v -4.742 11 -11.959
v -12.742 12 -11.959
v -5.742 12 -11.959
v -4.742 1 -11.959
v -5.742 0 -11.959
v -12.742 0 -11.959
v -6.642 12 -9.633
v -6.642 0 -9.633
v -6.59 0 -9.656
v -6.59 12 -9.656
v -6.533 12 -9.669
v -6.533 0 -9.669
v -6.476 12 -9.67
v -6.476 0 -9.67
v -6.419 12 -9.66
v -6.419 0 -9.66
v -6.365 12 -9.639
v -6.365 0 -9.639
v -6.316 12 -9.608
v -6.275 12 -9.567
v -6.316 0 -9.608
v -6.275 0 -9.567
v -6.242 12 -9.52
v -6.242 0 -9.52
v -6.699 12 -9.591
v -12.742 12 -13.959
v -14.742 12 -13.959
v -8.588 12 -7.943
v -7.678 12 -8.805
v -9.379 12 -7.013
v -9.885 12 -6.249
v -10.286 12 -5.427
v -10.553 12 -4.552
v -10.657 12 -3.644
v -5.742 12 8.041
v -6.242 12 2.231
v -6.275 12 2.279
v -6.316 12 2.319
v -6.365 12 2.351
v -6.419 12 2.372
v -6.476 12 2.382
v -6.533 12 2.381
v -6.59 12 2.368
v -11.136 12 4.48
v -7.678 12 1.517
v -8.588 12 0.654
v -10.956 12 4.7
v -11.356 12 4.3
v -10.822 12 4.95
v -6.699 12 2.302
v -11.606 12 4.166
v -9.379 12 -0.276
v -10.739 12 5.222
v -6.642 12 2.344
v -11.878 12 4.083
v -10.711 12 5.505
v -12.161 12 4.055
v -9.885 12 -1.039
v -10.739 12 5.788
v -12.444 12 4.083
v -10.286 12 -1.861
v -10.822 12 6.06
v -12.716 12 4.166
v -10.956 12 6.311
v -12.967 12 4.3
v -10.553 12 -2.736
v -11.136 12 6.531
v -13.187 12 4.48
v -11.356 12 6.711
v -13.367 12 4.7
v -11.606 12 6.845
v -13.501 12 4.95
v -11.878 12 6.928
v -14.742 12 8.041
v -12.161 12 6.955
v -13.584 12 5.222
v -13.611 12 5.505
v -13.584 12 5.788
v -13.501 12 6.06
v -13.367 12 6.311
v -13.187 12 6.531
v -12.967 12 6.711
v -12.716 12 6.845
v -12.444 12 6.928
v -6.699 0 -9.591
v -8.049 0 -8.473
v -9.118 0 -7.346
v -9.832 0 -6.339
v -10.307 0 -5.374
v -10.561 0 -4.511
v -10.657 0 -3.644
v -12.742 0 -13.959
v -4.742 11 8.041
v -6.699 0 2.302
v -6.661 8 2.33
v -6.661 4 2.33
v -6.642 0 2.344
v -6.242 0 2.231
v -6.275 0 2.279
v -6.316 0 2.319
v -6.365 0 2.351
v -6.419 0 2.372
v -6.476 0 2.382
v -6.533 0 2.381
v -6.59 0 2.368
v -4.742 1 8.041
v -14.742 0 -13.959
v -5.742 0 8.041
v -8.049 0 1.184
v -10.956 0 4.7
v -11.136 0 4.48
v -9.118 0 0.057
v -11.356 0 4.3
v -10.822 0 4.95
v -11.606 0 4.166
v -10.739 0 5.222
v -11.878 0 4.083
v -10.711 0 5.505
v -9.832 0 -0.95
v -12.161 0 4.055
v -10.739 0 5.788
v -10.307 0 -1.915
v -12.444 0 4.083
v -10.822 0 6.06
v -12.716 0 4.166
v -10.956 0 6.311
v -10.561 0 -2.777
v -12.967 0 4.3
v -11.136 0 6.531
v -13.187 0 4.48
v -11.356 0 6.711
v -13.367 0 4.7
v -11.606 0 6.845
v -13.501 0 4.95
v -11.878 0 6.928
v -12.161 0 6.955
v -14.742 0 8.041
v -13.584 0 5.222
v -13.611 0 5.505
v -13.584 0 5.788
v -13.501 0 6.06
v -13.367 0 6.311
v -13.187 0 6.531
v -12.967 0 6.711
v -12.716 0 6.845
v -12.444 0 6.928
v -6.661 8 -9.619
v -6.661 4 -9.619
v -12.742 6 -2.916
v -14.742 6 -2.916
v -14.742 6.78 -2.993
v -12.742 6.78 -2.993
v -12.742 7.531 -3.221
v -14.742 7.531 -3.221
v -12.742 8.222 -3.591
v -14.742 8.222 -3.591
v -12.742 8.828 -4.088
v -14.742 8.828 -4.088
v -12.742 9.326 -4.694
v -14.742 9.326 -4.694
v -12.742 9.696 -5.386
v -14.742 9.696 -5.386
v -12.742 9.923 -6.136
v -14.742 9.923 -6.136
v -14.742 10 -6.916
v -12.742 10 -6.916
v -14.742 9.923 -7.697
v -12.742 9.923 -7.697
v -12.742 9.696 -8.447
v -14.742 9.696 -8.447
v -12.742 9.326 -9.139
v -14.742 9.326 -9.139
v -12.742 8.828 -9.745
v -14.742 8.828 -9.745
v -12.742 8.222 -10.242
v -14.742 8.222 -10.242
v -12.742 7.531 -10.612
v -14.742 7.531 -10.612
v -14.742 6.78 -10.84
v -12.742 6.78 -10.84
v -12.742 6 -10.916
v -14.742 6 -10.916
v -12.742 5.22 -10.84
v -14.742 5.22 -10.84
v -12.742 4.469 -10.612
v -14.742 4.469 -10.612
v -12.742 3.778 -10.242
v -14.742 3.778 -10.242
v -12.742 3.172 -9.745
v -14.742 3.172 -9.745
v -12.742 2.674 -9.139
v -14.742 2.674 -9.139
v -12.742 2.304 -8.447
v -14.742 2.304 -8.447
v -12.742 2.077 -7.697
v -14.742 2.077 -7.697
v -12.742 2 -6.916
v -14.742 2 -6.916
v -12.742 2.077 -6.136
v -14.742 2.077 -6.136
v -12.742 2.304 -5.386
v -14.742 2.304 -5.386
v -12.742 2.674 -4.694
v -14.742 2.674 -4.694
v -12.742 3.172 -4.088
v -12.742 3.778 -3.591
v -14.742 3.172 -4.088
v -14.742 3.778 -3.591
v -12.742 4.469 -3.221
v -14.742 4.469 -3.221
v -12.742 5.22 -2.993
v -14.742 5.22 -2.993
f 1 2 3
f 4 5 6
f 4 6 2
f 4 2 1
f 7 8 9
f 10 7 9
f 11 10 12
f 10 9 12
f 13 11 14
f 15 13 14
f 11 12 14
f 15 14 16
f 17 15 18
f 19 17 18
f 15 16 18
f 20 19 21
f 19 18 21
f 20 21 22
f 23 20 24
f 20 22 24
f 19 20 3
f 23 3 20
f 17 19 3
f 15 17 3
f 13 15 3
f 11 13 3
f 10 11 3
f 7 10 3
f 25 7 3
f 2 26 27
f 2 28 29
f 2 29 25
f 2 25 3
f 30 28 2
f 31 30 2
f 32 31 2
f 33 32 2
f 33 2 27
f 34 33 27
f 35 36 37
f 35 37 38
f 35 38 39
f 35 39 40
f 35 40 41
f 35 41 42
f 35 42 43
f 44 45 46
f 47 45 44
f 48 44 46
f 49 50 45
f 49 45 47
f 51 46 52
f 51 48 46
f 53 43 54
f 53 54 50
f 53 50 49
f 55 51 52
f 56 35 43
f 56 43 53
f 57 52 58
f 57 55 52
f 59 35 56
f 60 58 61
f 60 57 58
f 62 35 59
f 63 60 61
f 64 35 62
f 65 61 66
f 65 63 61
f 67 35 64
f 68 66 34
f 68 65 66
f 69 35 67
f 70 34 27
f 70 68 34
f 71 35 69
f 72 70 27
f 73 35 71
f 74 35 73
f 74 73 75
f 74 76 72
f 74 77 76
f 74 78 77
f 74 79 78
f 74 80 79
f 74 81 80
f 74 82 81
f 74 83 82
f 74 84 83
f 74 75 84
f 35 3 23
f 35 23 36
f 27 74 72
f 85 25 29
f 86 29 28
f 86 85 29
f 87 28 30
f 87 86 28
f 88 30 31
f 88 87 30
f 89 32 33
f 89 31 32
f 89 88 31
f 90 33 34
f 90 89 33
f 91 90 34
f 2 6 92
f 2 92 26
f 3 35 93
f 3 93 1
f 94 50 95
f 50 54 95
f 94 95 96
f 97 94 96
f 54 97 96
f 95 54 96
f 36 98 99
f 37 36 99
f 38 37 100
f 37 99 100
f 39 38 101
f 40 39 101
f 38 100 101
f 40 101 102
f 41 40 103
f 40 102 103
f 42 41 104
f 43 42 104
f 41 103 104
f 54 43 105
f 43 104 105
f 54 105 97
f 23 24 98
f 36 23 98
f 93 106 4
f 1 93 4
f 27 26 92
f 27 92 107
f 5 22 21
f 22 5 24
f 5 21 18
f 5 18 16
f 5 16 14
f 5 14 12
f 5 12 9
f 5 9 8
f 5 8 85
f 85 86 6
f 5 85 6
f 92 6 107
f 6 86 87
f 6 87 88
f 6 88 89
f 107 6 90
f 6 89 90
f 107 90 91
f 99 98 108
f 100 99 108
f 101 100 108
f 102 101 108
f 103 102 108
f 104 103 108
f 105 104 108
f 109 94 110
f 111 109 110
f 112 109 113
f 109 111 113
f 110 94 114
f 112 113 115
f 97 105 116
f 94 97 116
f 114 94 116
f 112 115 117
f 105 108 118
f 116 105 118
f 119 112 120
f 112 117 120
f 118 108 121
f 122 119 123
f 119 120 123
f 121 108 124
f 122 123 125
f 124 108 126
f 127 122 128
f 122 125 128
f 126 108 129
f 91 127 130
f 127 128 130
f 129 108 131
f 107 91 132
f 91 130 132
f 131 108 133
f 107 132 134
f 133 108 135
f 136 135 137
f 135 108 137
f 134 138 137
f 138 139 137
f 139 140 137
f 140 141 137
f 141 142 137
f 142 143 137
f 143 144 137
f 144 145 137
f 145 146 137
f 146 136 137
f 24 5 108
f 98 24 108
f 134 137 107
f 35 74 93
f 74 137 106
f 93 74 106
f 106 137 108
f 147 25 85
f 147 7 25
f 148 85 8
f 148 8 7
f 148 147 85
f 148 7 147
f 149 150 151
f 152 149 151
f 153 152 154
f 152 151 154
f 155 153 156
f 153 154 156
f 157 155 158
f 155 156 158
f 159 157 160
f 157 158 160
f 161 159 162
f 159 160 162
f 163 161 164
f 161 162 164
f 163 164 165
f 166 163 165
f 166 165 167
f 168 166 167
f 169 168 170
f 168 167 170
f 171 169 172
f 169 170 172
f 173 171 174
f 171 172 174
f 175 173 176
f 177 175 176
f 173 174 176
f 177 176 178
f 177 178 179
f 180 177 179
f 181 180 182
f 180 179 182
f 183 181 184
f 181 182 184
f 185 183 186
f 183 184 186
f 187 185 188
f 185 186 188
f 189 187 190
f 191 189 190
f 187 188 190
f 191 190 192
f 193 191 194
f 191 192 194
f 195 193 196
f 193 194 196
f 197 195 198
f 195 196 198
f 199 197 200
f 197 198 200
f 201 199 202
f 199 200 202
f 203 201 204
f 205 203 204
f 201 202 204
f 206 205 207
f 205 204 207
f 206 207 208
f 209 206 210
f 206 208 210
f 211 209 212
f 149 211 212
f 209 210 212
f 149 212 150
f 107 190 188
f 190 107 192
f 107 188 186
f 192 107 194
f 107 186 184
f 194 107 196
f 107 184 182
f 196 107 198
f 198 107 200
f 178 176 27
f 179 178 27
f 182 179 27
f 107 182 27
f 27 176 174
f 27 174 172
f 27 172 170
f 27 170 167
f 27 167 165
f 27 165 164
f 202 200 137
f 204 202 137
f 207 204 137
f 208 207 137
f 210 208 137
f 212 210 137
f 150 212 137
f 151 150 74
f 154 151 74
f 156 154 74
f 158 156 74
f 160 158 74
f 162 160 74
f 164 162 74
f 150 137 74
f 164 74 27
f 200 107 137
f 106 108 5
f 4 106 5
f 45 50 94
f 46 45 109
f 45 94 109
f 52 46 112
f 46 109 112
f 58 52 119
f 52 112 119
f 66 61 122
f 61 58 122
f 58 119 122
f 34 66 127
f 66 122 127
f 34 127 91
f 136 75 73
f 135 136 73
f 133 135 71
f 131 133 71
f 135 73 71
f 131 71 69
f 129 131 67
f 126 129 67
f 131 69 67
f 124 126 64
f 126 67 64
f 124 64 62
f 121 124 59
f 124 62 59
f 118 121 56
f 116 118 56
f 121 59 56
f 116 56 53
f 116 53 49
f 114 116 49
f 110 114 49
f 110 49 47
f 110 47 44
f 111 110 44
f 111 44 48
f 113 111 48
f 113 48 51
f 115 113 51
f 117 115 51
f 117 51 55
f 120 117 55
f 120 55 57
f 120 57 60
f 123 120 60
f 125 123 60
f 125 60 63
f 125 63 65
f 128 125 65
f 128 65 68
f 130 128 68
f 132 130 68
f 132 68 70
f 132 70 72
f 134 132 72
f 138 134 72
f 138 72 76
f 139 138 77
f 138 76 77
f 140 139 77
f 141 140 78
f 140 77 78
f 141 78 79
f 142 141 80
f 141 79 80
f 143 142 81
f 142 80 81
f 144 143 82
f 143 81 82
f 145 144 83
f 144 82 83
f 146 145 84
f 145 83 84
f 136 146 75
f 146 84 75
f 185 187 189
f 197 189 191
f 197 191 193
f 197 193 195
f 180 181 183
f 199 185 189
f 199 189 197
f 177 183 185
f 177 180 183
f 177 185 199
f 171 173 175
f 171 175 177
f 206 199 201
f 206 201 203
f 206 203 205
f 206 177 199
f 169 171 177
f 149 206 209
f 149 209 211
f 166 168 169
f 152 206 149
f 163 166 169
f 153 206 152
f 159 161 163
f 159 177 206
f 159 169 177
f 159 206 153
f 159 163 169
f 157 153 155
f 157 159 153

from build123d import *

# Parameters (mm, degrees)
SKETCH2_W           = 10
SKETCH2_H           = 20
BOSS_EXTRUDE1_DEPTH = 12
SKETCH4_R           = 1.45
CUT_EXTRUDE1_DEPTH  = 22
SKETCH5_R           = 0.201375714
CUT_EXTRUDE2_DEPTH  = 34
SKETCH6_R           = 4
CUT_EXTRUDE3_DEPTH  = 2
SKETCH7_W           = 2
SKETCH7_H           = 12
BOSS_EXTRUDE4_DEPTH = 2
CHAMFER1_SIZE       = 1


with BuildPart() as part:
    # Sketch2 → Boss-Extrude1 (new body)
    with BuildSketch(Plane(origin=(0, 0, 0), x_dir=(1, 0, 0), z_dir=(0, 1, 0))):
        with Locations((-9.742268041, 1.958762887)):
            Rectangle(SKETCH2_W, SKETCH2_H)
    extrude(amount=BOSS_EXTRUDE1_DEPTH)

    # Sketch4 → Cut-Extrude1 (cut)
    with BuildSketch(Plane(origin=(0, 12, 0), x_dir=(1, 0, 0), z_dir=(0, 1, 0))):
        with Locations(Location((-12.161364559, -5.505377828, 0), (0, 0, 270))):
            Circle(SKETCH4_R)
    extrude(amount=-CUT_EXTRUDE1_DEPTH, mode=Mode.SUBTRACT)

    # Sketch5 → Cut-Extrude2 (cut)
    # profile 1 of 2: a face of its own
    with BuildSketch(Plane.XZ):
        with BuildLine():
            Line((-6.242268041, -9.519810645), (-6.242268041, 2.231313467))
            ThreePointArc((-6.242268041, 2.231313467), (-6.418660257, 2.371807213), (-6.642496519, 2.344420462))
            add(Edge.make_bspline(
                [(-6.642496519, 2.344420462), (-6.66140925, 2.33038701), (-6.68025518, 2.316351489), (-6.699034308, 2.302313899)],
                knots=[0.023195247, 0.023195247, 0.023195247, 0.023195247, 0.026563492, 0.026563492, 0.026563492, 0.026563492], degree=3))
            add(Edge.make_bspline(
                [(-6.699034308, 2.302313899), (-9.211405567, 0.424290628), (-10.573371912, -1.556580292), (-10.656105812, -3.577082439), (-10.65744251, -3.644248589)],
                knots=[0.026563492, 0.026563492, 0.026563492, 0.026563492, 0.477185204, 0.492669554, 0.492669554, 0.492669554, 0.492669554], degree=3))
            add(Edge.make_bspline(
                [(-6.699034308, -9.590811077), (-9.211405567, -7.712787806), (-10.573371912, -5.731916886), (-10.656105812, -3.711414739), (-10.65744251, -3.644248589)],
                knots=[0.026563492, 0.026563492, 0.026563492, 0.026563492, 0.477185204, 0.492669554, 0.492669554, 0.492669554, 0.492669554], degree=3))
            add(Edge.make_bspline(
                [(-6.642496519, -9.63291764), (-6.66140925, -9.618884188), (-6.68025518, -9.604848667), (-6.699034308, -9.590811077)],
                knots=[0.023195247, 0.023195247, 0.023195247, 0.023195247, 0.026563492, 0.026563492, 0.026563492, 0.026563492], degree=3))
            ThreePointArc((-6.642496519, -9.63291764), (-6.418660257, -9.660304391), (-6.242268041, -9.519810645))
        make_face()
        with Locations((-7.81457768, -3.845615826)):
            Circle(SKETCH5_R, mode=Mode.SUBTRACT)
    # profile 2 of 2: a face of its own
    with BuildSketch(Plane.XZ):
        with Locations((-7.81457768, -3.845615826)):
            Circle(SKETCH5_R)
    extrude(amount=-CUT_EXTRUDE2_DEPTH, mode=Mode.SUBTRACT)

    # Sketch6 → Cut-Extrude3 (cut)
    with BuildSketch(Plane.ZY.offset(14.742268041)):
        with Locations((-6.916385821, 6)):
            Circle(SKETCH6_R)
    extrude(amount=-CUT_EXTRUDE3_DEPTH, mode=Mode.SUBTRACT)

    # Sketch7 → Boss-Extrude4 (add)
    with BuildSketch(Plane(origin=(0, 0, -11.958762887), x_dir=(-1, 0, 0), z_dir=(0, 0, -1))):
        with Locations((13.742268041, 6)):
            Rectangle(SKETCH7_W, SKETCH7_H)
    extrude(amount=BOSS_EXTRUDE4_DEPTH)

    # Chamfer1
    chamfer1_edges = [part.edges().sort_by_distance(p)[0] for p in [
        (-4.742268041, 0, -1.958762887),
        (-4.742268041, 12, -1.958762887),
    ]]
    chamfer(chamfer1_edges, length=CHAMFER1_SIZE)


solid = part.part
